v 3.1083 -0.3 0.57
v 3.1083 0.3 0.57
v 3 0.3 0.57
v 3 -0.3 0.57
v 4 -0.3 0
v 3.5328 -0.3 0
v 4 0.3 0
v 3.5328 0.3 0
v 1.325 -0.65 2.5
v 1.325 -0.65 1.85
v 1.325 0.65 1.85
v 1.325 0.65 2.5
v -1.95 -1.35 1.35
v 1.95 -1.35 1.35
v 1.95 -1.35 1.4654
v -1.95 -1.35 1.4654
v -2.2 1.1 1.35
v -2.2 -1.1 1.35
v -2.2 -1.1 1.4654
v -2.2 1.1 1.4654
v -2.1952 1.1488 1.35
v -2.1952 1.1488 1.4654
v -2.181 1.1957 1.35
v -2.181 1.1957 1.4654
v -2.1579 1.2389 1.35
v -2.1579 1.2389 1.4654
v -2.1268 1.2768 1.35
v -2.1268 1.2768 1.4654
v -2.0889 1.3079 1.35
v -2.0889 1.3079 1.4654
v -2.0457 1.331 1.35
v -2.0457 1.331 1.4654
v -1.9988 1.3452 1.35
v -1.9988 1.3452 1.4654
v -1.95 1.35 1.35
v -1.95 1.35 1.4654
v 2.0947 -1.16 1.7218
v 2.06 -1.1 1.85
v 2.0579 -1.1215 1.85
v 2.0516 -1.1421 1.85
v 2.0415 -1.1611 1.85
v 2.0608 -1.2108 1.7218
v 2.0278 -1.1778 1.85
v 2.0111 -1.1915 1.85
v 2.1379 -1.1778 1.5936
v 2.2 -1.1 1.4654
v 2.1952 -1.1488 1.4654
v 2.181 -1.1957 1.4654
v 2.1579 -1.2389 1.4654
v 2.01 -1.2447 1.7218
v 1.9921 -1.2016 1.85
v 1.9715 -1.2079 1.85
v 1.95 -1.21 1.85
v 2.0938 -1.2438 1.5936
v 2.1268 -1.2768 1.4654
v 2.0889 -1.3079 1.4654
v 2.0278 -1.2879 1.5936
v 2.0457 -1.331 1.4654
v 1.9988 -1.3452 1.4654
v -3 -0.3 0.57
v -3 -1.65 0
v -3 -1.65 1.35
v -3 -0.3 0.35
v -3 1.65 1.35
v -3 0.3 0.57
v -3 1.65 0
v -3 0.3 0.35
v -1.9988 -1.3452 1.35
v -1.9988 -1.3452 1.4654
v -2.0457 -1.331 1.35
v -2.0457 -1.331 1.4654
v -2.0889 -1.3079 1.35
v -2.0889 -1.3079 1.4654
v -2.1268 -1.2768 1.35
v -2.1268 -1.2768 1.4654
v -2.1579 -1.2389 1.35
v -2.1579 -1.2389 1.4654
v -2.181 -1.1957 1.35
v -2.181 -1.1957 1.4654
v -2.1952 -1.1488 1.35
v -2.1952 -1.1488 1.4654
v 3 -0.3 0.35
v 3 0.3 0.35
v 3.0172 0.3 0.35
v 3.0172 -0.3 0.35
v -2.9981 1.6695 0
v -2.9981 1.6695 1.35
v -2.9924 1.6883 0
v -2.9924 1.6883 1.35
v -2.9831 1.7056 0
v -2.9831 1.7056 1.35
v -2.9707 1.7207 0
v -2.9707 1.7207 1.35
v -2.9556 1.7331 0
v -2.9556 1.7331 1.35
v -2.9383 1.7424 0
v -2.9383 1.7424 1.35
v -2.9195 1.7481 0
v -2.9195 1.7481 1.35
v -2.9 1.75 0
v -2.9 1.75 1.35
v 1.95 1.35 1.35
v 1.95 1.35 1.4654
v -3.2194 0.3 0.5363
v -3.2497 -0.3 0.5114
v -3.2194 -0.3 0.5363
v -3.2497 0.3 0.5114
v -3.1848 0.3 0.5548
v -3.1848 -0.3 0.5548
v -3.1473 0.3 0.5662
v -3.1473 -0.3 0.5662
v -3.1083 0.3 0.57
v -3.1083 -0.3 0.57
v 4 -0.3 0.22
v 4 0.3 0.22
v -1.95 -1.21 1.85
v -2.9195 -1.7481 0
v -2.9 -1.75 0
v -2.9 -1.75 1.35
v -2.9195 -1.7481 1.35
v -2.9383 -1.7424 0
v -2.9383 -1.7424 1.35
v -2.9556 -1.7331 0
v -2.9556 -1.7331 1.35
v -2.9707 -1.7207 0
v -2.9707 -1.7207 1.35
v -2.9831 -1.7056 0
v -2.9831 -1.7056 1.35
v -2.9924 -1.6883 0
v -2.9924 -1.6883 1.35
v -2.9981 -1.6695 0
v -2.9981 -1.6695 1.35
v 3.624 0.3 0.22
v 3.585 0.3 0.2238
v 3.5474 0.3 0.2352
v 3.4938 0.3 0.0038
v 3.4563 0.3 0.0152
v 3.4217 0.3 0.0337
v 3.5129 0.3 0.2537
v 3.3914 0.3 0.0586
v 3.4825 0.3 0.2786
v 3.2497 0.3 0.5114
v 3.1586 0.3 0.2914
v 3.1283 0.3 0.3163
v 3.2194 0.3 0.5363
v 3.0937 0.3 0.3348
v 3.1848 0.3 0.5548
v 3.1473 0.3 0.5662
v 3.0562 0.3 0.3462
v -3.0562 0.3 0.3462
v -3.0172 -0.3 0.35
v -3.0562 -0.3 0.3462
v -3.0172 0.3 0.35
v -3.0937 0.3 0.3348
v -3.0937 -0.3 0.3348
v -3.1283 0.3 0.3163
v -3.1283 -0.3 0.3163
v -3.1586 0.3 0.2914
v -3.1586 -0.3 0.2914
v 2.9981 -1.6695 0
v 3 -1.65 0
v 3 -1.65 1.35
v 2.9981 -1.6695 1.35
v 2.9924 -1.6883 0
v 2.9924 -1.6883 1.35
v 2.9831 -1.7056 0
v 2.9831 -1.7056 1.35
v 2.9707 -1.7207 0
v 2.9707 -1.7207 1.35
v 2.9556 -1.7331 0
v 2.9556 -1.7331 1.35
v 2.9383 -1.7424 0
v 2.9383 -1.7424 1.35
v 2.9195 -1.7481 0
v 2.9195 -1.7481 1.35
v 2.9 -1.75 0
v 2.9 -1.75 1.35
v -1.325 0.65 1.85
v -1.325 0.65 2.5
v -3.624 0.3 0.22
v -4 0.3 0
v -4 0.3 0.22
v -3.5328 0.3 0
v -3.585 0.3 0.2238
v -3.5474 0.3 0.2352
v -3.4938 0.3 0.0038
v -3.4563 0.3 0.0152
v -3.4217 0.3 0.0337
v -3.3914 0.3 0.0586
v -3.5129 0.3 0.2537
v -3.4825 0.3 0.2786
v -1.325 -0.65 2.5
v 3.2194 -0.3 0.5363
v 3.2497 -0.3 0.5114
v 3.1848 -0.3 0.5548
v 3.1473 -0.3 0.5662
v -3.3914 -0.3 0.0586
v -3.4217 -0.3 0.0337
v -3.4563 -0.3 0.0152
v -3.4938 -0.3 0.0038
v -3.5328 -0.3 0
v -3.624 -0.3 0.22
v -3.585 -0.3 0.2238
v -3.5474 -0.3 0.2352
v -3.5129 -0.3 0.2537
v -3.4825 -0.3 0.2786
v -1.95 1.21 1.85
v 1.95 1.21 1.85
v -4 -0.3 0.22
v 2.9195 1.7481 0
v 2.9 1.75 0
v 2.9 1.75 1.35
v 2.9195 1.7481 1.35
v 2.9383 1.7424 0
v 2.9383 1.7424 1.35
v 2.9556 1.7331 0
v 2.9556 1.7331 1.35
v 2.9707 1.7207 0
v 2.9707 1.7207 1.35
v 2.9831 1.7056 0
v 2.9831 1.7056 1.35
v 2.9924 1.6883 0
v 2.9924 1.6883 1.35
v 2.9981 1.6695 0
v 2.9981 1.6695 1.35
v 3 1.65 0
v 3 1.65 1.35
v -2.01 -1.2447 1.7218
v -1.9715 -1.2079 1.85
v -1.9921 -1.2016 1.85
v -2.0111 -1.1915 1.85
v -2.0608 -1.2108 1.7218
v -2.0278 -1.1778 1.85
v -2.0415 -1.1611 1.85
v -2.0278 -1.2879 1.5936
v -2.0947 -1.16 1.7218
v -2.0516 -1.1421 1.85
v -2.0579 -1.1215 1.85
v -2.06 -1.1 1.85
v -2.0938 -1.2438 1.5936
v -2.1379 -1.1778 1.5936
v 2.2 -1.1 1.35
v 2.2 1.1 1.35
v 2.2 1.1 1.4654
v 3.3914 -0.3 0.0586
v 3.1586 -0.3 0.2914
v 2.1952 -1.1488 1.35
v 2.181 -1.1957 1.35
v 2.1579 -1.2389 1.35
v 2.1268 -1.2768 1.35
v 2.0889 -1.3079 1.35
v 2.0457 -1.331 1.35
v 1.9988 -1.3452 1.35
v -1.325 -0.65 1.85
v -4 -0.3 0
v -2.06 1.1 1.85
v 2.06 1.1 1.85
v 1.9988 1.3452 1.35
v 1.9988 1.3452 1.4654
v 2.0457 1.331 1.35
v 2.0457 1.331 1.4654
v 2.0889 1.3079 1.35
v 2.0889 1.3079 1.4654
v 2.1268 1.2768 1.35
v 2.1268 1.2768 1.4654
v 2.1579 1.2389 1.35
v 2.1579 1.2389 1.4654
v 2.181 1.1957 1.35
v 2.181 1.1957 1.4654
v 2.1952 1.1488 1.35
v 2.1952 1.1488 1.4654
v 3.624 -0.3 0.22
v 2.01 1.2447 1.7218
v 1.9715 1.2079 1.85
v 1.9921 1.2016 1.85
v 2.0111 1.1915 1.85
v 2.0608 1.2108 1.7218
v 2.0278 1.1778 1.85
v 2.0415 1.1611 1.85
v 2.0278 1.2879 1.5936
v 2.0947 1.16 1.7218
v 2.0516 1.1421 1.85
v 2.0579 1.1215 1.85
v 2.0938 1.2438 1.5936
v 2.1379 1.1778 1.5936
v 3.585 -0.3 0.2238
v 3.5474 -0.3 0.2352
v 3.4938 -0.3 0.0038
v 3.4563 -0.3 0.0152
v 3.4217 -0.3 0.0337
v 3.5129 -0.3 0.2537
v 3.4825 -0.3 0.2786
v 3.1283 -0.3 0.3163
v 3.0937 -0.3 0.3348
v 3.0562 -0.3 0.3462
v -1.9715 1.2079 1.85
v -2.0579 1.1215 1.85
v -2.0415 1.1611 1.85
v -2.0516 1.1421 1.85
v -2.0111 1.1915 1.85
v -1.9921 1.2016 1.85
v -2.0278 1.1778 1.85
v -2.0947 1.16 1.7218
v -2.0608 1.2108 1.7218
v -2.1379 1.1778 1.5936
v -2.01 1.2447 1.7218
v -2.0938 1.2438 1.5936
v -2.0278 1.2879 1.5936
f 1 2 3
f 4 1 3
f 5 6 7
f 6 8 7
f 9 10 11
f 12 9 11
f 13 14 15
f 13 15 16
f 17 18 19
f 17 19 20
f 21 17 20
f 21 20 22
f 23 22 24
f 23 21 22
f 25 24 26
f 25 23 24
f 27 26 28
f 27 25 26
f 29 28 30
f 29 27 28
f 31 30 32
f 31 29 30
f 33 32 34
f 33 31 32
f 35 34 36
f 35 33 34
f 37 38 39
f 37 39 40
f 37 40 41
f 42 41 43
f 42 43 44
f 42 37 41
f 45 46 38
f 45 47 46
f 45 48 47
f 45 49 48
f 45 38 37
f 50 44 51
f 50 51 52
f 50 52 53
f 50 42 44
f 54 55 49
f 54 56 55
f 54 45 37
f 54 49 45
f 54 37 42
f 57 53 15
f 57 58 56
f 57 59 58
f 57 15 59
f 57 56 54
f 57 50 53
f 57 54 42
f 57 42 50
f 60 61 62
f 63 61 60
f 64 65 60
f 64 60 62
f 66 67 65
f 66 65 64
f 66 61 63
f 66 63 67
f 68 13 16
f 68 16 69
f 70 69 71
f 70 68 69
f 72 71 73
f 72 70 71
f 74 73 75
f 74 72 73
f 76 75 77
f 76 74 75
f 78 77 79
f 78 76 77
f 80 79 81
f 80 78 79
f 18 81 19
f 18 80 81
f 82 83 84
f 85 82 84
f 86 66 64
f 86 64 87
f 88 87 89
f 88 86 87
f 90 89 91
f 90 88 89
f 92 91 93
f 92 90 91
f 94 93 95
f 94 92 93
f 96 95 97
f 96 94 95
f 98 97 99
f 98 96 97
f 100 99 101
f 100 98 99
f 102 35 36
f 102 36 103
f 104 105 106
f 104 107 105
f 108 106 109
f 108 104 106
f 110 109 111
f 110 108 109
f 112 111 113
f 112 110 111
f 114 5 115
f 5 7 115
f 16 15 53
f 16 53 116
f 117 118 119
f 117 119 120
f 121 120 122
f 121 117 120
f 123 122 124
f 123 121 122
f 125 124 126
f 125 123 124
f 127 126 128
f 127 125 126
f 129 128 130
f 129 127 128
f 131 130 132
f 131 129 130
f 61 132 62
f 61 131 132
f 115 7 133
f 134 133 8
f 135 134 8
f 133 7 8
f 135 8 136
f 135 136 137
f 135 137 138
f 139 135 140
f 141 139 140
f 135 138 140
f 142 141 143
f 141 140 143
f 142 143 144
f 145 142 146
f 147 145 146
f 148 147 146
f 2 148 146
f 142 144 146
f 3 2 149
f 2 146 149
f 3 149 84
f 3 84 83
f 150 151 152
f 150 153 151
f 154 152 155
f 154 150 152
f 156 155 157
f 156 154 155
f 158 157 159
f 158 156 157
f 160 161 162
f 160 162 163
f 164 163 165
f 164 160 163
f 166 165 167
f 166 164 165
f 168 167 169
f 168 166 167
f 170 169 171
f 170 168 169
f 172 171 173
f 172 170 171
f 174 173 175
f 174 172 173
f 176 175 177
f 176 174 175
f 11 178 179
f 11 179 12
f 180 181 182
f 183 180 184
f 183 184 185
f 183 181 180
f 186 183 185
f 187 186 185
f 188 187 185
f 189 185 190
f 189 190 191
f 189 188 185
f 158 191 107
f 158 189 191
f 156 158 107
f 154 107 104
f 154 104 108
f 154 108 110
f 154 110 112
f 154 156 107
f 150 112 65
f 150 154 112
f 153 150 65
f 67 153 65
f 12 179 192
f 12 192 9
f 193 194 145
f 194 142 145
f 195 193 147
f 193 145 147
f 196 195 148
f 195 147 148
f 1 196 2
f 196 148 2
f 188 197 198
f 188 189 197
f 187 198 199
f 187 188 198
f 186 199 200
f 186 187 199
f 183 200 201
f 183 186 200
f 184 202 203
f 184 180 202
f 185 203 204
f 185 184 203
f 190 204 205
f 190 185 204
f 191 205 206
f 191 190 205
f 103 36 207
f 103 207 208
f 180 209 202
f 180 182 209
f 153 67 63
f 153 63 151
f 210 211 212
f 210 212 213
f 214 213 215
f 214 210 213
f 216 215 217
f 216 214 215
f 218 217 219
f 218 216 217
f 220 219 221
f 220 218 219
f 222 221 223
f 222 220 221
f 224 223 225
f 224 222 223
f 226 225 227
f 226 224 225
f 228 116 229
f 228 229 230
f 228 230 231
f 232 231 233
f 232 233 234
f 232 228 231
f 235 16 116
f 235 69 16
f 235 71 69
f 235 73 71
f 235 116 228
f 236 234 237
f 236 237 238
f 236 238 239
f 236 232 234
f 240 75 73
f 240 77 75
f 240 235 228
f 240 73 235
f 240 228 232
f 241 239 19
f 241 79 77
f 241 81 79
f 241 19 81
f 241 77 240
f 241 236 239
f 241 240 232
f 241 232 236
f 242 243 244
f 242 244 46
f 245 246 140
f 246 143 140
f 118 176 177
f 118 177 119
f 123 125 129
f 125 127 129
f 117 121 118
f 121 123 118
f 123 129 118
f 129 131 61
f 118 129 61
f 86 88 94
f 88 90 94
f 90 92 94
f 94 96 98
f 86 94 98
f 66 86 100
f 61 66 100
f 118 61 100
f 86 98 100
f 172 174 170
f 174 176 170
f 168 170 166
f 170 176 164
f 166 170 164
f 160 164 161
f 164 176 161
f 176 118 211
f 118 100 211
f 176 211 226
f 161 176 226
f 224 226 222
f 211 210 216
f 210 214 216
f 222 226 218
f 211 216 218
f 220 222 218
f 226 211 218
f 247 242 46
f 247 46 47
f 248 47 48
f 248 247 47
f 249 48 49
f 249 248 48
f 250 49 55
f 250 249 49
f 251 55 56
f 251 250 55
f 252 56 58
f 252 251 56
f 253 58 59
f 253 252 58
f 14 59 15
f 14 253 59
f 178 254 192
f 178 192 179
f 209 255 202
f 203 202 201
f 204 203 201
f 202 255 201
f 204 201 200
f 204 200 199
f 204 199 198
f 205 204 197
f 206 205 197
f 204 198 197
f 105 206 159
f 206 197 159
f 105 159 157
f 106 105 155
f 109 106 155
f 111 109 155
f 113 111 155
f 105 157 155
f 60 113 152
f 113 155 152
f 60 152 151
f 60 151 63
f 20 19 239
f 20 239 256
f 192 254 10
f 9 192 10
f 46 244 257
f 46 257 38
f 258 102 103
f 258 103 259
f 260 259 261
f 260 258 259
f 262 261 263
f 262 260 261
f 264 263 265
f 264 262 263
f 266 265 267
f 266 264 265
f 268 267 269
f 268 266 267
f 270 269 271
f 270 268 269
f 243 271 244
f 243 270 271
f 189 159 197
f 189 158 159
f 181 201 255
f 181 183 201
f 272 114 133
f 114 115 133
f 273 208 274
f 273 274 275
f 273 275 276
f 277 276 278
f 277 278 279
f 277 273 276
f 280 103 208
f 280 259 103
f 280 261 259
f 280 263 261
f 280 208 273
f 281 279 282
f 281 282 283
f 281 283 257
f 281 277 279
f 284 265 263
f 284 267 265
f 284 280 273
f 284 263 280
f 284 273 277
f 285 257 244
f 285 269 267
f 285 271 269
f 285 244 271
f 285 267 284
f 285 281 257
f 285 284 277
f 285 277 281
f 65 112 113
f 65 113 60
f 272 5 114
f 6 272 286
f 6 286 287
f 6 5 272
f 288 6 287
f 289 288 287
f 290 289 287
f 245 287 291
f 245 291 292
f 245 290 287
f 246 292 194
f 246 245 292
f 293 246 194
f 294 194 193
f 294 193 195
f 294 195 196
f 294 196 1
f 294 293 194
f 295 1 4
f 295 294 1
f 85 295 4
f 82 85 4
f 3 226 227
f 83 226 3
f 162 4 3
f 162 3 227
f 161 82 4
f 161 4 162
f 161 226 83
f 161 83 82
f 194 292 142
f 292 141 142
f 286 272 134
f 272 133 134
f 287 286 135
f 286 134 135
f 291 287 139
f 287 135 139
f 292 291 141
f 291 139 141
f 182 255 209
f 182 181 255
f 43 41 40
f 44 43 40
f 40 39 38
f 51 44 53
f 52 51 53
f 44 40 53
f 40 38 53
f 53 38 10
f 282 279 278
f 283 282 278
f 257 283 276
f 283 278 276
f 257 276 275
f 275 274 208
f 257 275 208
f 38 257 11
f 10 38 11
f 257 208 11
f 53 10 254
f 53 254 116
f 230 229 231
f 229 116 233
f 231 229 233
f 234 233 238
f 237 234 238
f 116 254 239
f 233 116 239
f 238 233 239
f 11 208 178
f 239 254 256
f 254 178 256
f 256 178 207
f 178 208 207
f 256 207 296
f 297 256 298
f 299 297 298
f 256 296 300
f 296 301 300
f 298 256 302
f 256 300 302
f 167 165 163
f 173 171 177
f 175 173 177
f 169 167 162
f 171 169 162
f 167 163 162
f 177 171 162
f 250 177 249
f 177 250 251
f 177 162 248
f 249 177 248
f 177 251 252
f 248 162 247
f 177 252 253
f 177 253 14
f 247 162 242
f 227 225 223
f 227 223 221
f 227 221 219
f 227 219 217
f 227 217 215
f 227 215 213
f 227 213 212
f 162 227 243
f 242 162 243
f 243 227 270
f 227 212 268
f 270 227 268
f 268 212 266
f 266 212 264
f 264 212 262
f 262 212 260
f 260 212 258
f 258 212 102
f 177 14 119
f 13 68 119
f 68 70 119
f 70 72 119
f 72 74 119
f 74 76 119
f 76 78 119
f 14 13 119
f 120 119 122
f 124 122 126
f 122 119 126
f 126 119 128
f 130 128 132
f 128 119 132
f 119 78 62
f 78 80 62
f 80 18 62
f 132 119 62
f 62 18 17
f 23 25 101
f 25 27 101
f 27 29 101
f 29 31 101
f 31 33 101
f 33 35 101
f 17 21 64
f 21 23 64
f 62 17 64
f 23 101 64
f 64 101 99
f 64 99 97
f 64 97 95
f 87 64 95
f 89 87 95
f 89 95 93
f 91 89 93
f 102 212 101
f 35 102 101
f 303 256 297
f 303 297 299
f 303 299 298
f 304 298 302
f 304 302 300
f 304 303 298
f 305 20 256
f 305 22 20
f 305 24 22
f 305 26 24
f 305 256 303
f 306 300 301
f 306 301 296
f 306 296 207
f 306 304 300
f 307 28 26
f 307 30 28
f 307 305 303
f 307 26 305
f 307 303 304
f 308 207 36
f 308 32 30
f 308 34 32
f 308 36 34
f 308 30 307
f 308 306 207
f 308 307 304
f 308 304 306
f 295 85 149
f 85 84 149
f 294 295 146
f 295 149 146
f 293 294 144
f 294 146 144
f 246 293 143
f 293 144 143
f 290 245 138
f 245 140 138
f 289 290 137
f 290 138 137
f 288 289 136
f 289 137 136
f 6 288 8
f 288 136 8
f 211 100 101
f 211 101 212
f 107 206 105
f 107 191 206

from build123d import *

# Parameters (mm, degrees)
BOSS_EXTRUDE1_DEPTH = 1.35
BOSS_EXTRUDE2_DEPTH = 1.85
SKETCH1_4_W         = 2.65
SKETCH1_4_H         = 1.3
BOSS_EXTRUDE3_DEPTH = 2.5
CHAMFER1_SIZE       = 0.14
CHAMFER1_SIZE2      = 0.384646839
BOSS_EXTRUDE4_DEPTH = 0.3


with BuildPart() as part:
    # Sketch1 → Boss-Extrude1 (new body)
    with BuildSketch(Plane.XY):
        with BuildLine():
            Line((-2.9, 1.75), (2.9, 1.75))
            ThreePointArc((2.9, 1.75), (2.970710678, 1.720710678), (3, 1.65))
            Line((3, 1.65), (3, -1.65))
            ThreePointArc((3, -1.65), (2.970710678, -1.720710678), (2.9, -1.75))
            Line((2.9, -1.75), (-2.9, -1.75))
            ThreePointArc((-2.9, -1.75), (-2.970710678, -1.720710678), (-3, -1.65))
            Line((-3, -1.65), (-3, 1.65))
            ThreePointArc((-3, 1.65), (-2.970710678, 1.720710678), (-2.9, 1.75))
        make_face()
    extrude(amount=BOSS_EXTRUDE1_DEPTH)

    # Sketch1<3> → Boss-Extrude2 (add)
    with BuildSketch(Plane.XY):
        with BuildLine():
            Line((-1.95, 1.35), (1.95, 1.35))
            ThreePointArc((1.95, 1.35), (2.126776695, 1.276776695), (2.2, 1.1))
            Line((2.2, 1.1), (2.2, -1.1))
            ThreePointArc((2.2, -1.1), (2.126776695, -1.276776695), (1.95, -1.35))
            Line((1.95, -1.35), (-1.95, -1.35))
            ThreePointArc((-1.95, -1.35), (-2.126776695, -1.276776695), (-2.2, -1.1))
            Line((-2.2, -1.1), (-2.2, 1.1))
            ThreePointArc((-2.2, 1.1), (-2.126776695, 1.276776695), (-1.95, 1.35))
        make_face()
    extrude(amount=BOSS_EXTRUDE2_DEPTH)

    # Sketch1<4> → Boss-Extrude3 (add)
    with BuildSketch(Plane.XY):
        Rectangle(SKETCH1_4_W, SKETCH1_4_H)
    extrude(amount=BOSS_EXTRUDE3_DEPTH)

    # Chamfer1
    chamfer1_edges = [part.edges().sort_by_distance(p)[0] for p in [
        (0, -1.35, 1.85),
        (-2.126776695, -1.276776695, 1.85),
        (-2.2, 0, 1.85),
        (-2.126776695, 1.276776695, 1.85),
        (2.2, 0, 1.85),
        (2.126776695, 1.276776695, 1.85),
        (0, 1.35, 1.85),
    ]]
    chamfer1_side = [part.faces().sort_by_distance(p)[0] for p in [
        (0, 1.298376362, 1.85),
    ]]
    chamfer(chamfer1_edges, length=CHAMFER1_SIZE, length2=CHAMFER1_SIZE2, reference=chamfer1_side[0])

    # Sketch2 → Boss-Extrude4 (add, symmetric)
    with BuildSketch(Plane(origin=(0, 0, 0), x_dir=(1, 0, 0), z_dir=(0, 1, 0))):
        with BuildLine():
            Line((3, -0.35), (3.017157288, -0.35))
            ThreePointArc((3.017157288, -0.35), (3.093693974, -0.334775907), (3.158578644, -0.291421356))
            Line((3.158578644, -0.291421356), (3.391421356, -0.058578644))
            ThreePointArc((3.391421356, -0.058578644), (3.456306026, -0.015224093), (3.532842712, 0))
            Line((3.532842712, 0), (4, 0))
            Line((4, 0), (4, -0.22))
            Line((4, -0.22), (3.623969696, -0.22))
            ThreePointArc((3.623969696, -0.22), (3.54743301, -0.235224093), (3.48254834, -0.278578644))
            Line((3.48254834, -0.278578644), (3.249705627, -0.511421356))
            ThreePointArc((3.249705627, -0.511421356), (3.184820958, -0.554775907), (3.108284271, -0.57))
            Line((3.108284271, -0.57), (3, -0.57))
            Line((3, -0.57), (3, -0.35))
        make_face()
    boss_extrude4 = extrude(amount=BOSS_EXTRUDE4_DEPTH, both=True)

    # Mirror1: Boss-Extrude4 across plane
    add(boss_extrude4.mirror(Plane(origin=(0, 0, 0), x_dir=(0, 0, 1), z_dir=(1, 0, 0))))


solid = part.part
